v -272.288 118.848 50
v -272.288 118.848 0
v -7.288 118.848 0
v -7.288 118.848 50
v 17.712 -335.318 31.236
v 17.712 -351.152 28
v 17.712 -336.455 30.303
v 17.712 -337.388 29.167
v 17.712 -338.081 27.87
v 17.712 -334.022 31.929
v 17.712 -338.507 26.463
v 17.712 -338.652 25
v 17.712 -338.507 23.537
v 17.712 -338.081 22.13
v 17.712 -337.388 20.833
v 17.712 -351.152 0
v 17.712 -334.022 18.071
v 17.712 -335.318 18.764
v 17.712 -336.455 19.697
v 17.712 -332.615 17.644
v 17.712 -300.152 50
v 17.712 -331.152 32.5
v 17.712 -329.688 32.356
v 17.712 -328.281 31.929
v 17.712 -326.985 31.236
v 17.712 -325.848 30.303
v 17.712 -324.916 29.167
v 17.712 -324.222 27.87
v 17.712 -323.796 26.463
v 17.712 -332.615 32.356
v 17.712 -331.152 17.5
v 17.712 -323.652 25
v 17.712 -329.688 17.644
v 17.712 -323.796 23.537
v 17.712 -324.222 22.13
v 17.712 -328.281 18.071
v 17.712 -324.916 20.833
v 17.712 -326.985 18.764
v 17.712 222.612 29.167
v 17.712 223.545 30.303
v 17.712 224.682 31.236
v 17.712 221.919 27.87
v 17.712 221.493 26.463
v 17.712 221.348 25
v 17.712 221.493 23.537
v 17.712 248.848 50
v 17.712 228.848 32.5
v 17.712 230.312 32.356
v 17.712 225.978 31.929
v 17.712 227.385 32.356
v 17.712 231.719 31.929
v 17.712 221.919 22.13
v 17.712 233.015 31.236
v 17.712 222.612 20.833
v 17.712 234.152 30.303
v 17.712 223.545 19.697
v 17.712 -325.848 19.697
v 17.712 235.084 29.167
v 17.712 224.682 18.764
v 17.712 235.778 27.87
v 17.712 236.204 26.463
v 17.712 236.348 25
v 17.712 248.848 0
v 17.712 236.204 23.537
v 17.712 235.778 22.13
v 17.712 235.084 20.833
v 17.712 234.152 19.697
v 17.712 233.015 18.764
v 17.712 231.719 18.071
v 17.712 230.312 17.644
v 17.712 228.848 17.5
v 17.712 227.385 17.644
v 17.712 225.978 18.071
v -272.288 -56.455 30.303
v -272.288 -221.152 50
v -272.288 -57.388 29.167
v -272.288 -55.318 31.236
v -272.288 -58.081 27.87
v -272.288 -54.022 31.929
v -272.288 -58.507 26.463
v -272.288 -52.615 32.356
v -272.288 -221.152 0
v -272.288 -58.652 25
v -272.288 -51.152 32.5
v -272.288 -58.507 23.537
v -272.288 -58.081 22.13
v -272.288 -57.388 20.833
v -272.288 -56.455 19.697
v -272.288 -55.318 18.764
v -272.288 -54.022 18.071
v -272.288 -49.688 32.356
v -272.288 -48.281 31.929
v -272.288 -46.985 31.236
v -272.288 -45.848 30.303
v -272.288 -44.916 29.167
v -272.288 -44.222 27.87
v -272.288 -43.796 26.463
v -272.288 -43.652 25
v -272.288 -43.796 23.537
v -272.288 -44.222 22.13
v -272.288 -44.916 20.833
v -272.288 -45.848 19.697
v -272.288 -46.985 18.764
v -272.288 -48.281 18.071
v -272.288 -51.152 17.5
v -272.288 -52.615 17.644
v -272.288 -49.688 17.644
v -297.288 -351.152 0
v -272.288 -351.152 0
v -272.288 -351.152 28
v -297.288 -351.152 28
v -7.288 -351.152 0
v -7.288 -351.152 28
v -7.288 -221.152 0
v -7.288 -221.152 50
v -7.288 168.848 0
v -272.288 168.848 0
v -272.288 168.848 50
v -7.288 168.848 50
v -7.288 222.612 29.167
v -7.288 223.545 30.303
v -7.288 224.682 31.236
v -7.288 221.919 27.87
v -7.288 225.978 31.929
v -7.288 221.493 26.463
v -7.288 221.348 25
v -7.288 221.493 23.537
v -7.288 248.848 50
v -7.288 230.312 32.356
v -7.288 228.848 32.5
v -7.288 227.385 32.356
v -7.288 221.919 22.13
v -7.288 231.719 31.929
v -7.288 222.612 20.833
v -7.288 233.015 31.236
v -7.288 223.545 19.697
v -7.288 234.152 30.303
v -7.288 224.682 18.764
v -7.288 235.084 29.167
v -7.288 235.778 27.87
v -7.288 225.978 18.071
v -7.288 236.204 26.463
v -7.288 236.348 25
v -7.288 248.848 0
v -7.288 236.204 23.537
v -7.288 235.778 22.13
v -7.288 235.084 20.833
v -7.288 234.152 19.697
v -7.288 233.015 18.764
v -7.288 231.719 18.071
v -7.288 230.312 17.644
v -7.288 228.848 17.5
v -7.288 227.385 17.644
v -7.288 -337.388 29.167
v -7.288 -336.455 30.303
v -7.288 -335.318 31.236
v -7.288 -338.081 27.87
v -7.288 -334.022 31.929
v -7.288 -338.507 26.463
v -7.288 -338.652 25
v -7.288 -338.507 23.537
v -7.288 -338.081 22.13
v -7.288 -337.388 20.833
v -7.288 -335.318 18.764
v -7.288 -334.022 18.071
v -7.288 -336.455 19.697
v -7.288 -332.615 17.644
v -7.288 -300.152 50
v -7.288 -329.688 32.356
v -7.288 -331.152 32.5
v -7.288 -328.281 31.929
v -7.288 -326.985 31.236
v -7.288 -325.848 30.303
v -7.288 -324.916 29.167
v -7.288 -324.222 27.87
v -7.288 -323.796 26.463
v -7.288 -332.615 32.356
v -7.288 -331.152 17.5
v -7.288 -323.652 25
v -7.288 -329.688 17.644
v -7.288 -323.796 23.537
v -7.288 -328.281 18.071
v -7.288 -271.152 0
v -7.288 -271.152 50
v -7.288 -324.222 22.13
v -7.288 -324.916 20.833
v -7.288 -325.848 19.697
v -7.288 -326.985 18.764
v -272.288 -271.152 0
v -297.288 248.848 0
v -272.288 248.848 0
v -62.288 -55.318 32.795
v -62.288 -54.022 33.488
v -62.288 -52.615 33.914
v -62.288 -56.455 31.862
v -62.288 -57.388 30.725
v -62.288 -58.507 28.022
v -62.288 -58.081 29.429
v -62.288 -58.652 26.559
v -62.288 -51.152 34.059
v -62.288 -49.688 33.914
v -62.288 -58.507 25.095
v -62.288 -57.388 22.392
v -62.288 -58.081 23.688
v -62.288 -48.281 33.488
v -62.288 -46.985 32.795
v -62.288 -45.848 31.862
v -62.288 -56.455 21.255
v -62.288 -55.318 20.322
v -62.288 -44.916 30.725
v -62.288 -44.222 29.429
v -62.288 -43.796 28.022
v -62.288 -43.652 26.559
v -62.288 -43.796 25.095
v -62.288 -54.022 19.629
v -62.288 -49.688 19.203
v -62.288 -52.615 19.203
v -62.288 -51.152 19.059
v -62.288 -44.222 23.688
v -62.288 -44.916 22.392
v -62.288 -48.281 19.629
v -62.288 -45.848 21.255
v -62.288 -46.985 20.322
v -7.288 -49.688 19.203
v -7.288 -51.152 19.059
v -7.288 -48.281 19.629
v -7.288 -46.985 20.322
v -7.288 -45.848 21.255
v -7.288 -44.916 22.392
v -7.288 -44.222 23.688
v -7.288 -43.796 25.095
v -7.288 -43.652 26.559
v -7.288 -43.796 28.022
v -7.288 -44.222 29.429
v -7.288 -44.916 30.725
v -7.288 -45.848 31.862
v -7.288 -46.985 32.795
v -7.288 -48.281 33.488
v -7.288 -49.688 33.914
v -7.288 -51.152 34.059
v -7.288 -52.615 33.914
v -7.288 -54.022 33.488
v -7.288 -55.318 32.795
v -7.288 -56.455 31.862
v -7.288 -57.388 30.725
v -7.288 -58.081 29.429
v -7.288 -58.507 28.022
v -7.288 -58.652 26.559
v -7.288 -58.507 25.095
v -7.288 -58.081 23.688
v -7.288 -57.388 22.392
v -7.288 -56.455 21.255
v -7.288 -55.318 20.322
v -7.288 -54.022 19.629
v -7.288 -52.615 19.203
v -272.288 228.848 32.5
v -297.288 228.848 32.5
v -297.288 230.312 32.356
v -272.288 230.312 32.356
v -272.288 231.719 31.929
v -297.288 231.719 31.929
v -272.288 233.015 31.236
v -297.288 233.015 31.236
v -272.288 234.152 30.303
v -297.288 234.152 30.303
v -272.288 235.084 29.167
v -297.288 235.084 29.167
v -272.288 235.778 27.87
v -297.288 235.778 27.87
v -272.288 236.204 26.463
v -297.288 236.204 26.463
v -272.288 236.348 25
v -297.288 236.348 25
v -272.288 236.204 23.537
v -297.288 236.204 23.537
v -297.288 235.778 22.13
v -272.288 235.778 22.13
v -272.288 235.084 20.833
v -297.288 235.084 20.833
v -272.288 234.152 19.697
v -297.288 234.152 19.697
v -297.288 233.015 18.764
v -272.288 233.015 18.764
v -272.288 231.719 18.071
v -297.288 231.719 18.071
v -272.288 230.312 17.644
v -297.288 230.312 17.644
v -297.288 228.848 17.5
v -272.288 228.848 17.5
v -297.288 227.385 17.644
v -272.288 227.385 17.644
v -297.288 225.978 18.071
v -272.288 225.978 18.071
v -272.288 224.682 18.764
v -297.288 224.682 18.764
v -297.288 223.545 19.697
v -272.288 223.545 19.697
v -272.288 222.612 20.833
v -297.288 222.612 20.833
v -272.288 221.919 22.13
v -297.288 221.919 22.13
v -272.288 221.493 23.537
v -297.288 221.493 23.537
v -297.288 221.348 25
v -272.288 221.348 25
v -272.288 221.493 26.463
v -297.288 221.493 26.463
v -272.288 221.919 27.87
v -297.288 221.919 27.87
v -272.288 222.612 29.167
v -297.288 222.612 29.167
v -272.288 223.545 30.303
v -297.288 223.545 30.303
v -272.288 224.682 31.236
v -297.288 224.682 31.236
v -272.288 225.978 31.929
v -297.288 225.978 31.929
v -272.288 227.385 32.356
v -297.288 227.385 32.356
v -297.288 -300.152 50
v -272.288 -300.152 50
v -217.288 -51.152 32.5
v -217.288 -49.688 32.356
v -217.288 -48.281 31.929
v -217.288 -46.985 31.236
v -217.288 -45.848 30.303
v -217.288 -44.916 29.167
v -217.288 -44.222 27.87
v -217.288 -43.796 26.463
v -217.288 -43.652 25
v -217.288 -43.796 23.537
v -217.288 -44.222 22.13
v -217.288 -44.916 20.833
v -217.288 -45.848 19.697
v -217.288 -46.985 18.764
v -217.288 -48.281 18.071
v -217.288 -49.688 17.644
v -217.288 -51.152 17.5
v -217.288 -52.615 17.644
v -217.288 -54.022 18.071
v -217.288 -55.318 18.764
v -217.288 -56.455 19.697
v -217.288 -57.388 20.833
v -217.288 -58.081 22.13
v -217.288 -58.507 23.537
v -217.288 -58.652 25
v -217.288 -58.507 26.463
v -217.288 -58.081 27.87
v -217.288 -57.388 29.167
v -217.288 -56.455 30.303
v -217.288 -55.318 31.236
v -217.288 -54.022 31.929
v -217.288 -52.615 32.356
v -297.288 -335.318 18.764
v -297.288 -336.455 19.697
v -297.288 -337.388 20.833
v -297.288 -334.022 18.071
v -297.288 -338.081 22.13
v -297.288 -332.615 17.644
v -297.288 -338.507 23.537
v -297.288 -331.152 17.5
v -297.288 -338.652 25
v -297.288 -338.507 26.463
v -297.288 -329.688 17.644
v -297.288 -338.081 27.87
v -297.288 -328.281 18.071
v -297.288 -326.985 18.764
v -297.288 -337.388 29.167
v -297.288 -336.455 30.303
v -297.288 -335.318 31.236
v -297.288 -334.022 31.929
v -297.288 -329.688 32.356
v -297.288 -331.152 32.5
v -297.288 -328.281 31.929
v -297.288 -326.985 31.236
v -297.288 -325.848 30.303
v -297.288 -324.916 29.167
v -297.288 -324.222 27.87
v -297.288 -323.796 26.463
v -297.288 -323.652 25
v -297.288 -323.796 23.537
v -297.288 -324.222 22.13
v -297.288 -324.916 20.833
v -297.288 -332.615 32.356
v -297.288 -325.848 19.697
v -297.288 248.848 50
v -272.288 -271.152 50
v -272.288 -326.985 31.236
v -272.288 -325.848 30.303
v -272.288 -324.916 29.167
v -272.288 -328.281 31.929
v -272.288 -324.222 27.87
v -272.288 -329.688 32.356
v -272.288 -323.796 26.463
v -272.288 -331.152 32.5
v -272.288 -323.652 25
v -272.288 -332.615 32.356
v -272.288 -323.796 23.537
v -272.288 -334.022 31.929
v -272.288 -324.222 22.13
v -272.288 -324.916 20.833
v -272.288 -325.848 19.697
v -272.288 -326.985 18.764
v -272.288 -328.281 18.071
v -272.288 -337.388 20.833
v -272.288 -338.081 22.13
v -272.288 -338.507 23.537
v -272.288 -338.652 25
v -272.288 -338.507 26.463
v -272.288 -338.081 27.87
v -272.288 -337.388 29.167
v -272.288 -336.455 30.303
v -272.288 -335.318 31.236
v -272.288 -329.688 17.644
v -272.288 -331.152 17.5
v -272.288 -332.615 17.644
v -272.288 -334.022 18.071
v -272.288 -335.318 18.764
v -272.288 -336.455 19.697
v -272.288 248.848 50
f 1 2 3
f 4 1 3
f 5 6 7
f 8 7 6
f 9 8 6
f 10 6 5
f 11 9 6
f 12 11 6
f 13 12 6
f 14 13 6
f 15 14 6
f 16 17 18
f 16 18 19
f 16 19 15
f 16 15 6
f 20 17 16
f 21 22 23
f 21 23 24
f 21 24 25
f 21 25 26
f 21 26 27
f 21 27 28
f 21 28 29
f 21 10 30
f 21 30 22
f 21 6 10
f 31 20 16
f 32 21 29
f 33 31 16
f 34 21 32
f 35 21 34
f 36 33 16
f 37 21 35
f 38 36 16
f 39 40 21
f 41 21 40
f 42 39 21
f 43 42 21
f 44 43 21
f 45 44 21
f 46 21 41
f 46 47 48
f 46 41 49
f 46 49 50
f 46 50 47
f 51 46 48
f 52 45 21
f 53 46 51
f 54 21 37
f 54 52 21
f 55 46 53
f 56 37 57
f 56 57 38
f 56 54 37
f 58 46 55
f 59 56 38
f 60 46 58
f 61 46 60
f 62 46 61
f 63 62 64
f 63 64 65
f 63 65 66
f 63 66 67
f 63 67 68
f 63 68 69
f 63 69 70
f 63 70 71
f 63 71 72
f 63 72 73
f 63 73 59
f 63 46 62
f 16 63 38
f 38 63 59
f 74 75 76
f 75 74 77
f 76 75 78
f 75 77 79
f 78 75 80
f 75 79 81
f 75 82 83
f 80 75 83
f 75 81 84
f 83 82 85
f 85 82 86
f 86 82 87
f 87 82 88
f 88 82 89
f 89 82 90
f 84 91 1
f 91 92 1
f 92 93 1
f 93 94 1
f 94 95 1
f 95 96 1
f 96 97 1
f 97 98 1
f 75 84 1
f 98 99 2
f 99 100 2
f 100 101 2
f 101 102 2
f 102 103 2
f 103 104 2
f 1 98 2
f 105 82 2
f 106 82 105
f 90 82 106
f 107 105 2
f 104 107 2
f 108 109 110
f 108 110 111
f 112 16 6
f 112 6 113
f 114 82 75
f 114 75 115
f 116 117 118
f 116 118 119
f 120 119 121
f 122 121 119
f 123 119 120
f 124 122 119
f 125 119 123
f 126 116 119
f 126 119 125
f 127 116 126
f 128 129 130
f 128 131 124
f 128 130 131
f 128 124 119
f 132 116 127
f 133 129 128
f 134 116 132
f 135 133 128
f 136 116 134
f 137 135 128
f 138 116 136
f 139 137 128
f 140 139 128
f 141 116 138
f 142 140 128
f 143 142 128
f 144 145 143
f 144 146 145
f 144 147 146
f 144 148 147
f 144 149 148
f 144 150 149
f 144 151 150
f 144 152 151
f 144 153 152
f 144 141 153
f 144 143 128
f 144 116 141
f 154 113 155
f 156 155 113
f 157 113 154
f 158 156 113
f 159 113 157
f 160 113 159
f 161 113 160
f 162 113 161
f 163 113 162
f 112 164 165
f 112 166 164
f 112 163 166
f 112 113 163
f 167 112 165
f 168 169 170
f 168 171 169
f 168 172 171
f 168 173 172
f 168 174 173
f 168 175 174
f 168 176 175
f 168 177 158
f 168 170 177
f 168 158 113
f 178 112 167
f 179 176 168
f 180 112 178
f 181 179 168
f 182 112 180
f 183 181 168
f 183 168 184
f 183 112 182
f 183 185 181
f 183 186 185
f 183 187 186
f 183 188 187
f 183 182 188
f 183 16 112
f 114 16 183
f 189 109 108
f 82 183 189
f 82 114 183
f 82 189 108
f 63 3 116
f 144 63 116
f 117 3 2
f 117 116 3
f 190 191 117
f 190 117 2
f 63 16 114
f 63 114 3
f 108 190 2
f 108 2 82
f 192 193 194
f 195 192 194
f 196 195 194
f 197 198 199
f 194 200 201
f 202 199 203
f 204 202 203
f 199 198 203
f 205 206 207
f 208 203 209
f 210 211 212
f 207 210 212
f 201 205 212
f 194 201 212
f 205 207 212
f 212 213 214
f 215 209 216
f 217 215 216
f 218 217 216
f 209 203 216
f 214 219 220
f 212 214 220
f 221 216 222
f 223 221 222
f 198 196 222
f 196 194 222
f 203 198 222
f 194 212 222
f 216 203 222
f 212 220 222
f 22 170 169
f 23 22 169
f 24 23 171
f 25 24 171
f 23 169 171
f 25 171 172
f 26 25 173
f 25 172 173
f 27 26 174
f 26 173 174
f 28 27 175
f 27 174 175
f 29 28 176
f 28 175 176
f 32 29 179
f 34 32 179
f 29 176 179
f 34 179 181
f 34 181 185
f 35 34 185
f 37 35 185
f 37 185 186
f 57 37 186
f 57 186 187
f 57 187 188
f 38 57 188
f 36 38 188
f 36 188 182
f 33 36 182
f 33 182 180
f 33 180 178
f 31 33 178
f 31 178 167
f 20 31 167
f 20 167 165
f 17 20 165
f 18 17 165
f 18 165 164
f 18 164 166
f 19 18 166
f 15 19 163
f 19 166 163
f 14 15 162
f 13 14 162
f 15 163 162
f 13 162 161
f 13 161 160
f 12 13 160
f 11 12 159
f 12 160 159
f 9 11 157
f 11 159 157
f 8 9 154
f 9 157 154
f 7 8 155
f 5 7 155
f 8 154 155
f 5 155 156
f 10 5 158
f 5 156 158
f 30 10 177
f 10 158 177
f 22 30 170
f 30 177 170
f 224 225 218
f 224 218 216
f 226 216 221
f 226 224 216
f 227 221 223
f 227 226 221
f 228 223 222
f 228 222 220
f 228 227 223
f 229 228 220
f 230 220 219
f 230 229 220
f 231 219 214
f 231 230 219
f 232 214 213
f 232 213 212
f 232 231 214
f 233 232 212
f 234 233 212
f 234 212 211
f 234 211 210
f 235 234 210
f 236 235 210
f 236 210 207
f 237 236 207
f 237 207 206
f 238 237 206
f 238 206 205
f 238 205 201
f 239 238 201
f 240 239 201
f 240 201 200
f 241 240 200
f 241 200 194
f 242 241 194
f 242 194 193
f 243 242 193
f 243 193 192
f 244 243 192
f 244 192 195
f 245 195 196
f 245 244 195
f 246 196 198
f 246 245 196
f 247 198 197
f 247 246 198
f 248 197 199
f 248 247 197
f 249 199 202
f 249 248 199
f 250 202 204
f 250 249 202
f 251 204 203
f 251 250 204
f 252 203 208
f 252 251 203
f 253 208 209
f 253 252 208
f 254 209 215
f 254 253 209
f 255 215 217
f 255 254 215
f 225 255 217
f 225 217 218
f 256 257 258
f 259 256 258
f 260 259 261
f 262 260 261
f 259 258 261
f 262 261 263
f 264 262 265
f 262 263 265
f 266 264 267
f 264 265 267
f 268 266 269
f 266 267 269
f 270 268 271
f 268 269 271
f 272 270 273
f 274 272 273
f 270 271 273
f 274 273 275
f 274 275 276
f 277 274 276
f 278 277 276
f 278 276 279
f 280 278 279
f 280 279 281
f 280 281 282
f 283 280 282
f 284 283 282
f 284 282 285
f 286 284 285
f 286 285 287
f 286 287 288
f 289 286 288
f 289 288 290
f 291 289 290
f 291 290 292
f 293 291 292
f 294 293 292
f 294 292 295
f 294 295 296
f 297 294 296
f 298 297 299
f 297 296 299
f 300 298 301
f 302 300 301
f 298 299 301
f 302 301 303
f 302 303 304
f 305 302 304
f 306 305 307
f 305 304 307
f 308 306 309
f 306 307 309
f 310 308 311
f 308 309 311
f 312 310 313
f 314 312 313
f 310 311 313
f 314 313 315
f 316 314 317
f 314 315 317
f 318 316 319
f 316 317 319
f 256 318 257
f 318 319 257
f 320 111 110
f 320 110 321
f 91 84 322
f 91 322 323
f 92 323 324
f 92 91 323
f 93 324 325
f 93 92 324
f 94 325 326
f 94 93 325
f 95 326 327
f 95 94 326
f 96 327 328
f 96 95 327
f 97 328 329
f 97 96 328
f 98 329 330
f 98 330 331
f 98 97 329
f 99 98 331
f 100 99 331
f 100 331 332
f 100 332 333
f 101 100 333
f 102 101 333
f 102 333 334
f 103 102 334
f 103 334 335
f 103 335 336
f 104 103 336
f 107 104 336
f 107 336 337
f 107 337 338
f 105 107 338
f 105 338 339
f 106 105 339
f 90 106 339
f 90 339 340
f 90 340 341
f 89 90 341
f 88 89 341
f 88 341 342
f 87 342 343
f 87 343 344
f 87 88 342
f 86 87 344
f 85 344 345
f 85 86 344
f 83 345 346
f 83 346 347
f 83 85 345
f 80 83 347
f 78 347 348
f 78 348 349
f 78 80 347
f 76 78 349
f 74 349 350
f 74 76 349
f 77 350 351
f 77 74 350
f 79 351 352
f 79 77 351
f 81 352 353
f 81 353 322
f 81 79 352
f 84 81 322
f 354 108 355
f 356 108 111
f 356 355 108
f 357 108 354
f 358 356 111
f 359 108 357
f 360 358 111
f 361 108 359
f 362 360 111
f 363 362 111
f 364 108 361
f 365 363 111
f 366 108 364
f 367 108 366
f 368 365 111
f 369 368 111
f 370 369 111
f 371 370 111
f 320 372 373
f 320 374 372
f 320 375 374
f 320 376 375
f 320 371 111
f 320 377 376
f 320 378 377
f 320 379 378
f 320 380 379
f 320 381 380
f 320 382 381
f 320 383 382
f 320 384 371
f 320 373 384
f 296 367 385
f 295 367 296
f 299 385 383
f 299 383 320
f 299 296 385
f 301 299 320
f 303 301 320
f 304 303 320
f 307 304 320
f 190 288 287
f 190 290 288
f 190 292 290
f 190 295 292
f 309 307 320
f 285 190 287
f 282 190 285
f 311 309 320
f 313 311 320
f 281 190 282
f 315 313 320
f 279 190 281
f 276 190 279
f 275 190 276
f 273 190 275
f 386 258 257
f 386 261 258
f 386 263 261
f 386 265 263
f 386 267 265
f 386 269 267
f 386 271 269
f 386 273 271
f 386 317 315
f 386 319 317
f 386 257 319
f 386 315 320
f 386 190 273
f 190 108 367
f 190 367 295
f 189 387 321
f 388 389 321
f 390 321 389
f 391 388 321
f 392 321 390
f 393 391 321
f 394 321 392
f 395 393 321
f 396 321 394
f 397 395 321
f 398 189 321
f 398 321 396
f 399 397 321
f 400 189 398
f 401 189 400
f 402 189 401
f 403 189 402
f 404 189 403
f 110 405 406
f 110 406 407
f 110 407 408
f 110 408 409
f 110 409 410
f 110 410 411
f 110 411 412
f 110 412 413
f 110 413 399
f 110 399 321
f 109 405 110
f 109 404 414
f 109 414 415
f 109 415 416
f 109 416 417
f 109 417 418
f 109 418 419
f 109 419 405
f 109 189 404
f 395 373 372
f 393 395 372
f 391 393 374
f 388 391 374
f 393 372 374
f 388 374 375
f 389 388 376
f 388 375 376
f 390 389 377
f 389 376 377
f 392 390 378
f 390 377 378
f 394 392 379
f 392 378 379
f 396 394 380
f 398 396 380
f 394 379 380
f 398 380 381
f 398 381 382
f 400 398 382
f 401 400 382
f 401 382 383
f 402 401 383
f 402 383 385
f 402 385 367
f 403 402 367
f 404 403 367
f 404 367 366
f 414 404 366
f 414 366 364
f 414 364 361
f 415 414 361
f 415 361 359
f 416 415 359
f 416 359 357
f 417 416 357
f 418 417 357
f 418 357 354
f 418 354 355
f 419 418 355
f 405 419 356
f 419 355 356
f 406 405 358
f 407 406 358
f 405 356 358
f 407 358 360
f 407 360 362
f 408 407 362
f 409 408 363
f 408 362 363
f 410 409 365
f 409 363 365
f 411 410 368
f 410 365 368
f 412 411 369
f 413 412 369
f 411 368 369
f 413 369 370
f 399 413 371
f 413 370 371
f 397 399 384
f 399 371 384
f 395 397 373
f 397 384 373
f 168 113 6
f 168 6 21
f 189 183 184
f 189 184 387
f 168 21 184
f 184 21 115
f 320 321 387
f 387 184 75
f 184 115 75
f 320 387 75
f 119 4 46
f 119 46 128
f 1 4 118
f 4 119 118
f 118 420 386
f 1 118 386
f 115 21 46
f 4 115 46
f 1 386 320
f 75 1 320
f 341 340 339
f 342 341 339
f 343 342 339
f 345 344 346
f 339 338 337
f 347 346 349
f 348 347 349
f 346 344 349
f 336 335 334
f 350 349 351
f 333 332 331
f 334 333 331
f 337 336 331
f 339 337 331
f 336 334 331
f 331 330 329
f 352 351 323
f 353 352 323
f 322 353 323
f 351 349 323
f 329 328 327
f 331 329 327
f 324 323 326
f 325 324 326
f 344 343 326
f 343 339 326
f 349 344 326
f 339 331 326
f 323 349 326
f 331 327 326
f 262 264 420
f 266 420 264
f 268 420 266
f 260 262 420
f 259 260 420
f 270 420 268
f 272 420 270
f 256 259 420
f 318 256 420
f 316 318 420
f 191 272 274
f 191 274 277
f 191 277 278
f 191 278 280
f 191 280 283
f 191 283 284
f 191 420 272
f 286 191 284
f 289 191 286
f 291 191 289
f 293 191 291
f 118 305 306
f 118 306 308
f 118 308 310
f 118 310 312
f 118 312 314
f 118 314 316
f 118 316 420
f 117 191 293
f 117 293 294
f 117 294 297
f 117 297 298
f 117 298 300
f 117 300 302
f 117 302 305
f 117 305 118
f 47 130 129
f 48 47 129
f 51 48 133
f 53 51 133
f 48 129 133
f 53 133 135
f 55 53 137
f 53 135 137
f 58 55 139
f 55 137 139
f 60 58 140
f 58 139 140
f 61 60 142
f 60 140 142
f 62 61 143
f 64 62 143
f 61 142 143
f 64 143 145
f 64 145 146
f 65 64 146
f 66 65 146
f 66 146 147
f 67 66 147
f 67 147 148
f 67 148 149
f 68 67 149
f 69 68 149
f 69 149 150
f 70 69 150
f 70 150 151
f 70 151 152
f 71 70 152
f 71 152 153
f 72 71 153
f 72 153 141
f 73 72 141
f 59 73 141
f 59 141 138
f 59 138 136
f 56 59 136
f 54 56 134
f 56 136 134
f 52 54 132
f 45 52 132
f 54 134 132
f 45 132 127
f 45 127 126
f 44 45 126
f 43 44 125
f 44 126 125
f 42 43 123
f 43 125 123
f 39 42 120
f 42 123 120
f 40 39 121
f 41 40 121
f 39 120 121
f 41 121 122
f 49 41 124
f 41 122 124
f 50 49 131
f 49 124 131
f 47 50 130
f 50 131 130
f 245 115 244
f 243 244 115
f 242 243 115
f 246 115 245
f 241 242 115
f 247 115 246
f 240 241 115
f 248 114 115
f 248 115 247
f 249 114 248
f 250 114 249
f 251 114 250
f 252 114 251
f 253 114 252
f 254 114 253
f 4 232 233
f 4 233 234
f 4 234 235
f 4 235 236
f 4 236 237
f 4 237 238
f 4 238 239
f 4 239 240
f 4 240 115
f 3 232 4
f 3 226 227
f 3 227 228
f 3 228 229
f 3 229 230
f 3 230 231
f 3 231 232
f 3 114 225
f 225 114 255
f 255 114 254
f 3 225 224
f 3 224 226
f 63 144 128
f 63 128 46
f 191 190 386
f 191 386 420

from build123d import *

# Parameters (mm, degrees)
SKETCH1_W               = 265
SKETCH1_H               = 340
BOSS_EXTRUDE1_DEPTH     = 50
SKETCH2_R               = 7.5
BOSS_EXTRUDE2_DEPTH     = 80
SKETCH7_R               = 7.5
BOSS_EXTRUDE3_DEPTH     = 80
SKETCH8_R               = 7.5
CUT_EXTRUDE1_DEPTH      = 410
SKETCH9_R               = 7.5
CUT_EXTRUDE2_DEPTH      = 410
CUT_EXTRUDE4_DEPTH      = 463.803826299
CUT_EXTRUDE4_DEPTH_BACK = 463.803826299


with BuildPart() as part:
    # Sketch1 → Boss-Extrude1 (new body)
    with BuildSketch(Plane.XY):
        Polygon((-7.287721529, 248.848476773), (17.712278471, 248.848476773), (17.712278471, -351.151523227), (-7.287721529, -351.151523227), (-7.287721529, -271.151523227), (-272.287721529, -271.151523227), (-272.287721529, -351.151523227), (-297.287721529, -351.151523227), (-297.287721529, 248.848476773), (-272.287721529, 248.848476773), (-272.287721529, 168.848476773), (-7.287721529, 168.848476773), align=None)
        with Locations((-139.787721529, -51.151523227)):
            Rectangle(SKETCH1_W, SKETCH1_H, mode=Mode.SUBTRACT)
    extrude(amount=BOSS_EXTRUDE1_DEPTH)

    # Sketch2 → Boss-Extrude2 (add)
    with BuildSketch(Plane(origin=(17.712278471, 0, 0), x_dir=(0, 0, -1), z_dir=(1, 0, 0))):
        with Locations((-26.558504248, -51.151523227)):
            Circle(SKETCH2_R)
    extrude(amount=-BOSS_EXTRUDE2_DEPTH)

    # Sketch7 → Boss-Extrude3 (add)
    with BuildSketch(Plane.ZY.offset(297.287721529)):
        with Locations((25, -51.151523227)):
            Circle(SKETCH7_R)
    extrude(amount=-BOSS_EXTRUDE3_DEPTH)

    # Sketch8 → Cut-Extrude1 (cut)
    with BuildSketch(Plane.ZY.offset(297.287721529)):
        with Locations((25, -331.151523227)):
            Circle(SKETCH8_R)
    extrude(amount=-CUT_EXTRUDE1_DEPTH, mode=Mode.SUBTRACT)

    # Sketch9 → Cut-Extrude2 (cut)
    with BuildSketch(Plane.ZY.offset(297.287721529)):
        with Locations((25, 228.848476773)):
            Circle(SKETCH9_R)
    extrude(amount=-CUT_EXTRUDE2_DEPTH, mode=Mode.SUBTRACT)

    # Sketch11 → Cut-Extrude4 (cut, two sides: drawn at the far end of the back side and taken through both)
    with BuildSketch(Plane(origin=(0, 0, 0), x_dir=(0, 0, -1), z_dir=(1, 0, 0)).offset(-CUT_EXTRUDE4_DEPTH_BACK)):
        Polygon((-50, -351.151523227), (-28, -351.151523227), (-50, -300.151523227), align=None)
    extrude(amount=CUT_EXTRUDE4_DEPTH + CUT_EXTRUDE4_DEPTH_BACK, mode=Mode.SUBTRACT)


solid = part.part
